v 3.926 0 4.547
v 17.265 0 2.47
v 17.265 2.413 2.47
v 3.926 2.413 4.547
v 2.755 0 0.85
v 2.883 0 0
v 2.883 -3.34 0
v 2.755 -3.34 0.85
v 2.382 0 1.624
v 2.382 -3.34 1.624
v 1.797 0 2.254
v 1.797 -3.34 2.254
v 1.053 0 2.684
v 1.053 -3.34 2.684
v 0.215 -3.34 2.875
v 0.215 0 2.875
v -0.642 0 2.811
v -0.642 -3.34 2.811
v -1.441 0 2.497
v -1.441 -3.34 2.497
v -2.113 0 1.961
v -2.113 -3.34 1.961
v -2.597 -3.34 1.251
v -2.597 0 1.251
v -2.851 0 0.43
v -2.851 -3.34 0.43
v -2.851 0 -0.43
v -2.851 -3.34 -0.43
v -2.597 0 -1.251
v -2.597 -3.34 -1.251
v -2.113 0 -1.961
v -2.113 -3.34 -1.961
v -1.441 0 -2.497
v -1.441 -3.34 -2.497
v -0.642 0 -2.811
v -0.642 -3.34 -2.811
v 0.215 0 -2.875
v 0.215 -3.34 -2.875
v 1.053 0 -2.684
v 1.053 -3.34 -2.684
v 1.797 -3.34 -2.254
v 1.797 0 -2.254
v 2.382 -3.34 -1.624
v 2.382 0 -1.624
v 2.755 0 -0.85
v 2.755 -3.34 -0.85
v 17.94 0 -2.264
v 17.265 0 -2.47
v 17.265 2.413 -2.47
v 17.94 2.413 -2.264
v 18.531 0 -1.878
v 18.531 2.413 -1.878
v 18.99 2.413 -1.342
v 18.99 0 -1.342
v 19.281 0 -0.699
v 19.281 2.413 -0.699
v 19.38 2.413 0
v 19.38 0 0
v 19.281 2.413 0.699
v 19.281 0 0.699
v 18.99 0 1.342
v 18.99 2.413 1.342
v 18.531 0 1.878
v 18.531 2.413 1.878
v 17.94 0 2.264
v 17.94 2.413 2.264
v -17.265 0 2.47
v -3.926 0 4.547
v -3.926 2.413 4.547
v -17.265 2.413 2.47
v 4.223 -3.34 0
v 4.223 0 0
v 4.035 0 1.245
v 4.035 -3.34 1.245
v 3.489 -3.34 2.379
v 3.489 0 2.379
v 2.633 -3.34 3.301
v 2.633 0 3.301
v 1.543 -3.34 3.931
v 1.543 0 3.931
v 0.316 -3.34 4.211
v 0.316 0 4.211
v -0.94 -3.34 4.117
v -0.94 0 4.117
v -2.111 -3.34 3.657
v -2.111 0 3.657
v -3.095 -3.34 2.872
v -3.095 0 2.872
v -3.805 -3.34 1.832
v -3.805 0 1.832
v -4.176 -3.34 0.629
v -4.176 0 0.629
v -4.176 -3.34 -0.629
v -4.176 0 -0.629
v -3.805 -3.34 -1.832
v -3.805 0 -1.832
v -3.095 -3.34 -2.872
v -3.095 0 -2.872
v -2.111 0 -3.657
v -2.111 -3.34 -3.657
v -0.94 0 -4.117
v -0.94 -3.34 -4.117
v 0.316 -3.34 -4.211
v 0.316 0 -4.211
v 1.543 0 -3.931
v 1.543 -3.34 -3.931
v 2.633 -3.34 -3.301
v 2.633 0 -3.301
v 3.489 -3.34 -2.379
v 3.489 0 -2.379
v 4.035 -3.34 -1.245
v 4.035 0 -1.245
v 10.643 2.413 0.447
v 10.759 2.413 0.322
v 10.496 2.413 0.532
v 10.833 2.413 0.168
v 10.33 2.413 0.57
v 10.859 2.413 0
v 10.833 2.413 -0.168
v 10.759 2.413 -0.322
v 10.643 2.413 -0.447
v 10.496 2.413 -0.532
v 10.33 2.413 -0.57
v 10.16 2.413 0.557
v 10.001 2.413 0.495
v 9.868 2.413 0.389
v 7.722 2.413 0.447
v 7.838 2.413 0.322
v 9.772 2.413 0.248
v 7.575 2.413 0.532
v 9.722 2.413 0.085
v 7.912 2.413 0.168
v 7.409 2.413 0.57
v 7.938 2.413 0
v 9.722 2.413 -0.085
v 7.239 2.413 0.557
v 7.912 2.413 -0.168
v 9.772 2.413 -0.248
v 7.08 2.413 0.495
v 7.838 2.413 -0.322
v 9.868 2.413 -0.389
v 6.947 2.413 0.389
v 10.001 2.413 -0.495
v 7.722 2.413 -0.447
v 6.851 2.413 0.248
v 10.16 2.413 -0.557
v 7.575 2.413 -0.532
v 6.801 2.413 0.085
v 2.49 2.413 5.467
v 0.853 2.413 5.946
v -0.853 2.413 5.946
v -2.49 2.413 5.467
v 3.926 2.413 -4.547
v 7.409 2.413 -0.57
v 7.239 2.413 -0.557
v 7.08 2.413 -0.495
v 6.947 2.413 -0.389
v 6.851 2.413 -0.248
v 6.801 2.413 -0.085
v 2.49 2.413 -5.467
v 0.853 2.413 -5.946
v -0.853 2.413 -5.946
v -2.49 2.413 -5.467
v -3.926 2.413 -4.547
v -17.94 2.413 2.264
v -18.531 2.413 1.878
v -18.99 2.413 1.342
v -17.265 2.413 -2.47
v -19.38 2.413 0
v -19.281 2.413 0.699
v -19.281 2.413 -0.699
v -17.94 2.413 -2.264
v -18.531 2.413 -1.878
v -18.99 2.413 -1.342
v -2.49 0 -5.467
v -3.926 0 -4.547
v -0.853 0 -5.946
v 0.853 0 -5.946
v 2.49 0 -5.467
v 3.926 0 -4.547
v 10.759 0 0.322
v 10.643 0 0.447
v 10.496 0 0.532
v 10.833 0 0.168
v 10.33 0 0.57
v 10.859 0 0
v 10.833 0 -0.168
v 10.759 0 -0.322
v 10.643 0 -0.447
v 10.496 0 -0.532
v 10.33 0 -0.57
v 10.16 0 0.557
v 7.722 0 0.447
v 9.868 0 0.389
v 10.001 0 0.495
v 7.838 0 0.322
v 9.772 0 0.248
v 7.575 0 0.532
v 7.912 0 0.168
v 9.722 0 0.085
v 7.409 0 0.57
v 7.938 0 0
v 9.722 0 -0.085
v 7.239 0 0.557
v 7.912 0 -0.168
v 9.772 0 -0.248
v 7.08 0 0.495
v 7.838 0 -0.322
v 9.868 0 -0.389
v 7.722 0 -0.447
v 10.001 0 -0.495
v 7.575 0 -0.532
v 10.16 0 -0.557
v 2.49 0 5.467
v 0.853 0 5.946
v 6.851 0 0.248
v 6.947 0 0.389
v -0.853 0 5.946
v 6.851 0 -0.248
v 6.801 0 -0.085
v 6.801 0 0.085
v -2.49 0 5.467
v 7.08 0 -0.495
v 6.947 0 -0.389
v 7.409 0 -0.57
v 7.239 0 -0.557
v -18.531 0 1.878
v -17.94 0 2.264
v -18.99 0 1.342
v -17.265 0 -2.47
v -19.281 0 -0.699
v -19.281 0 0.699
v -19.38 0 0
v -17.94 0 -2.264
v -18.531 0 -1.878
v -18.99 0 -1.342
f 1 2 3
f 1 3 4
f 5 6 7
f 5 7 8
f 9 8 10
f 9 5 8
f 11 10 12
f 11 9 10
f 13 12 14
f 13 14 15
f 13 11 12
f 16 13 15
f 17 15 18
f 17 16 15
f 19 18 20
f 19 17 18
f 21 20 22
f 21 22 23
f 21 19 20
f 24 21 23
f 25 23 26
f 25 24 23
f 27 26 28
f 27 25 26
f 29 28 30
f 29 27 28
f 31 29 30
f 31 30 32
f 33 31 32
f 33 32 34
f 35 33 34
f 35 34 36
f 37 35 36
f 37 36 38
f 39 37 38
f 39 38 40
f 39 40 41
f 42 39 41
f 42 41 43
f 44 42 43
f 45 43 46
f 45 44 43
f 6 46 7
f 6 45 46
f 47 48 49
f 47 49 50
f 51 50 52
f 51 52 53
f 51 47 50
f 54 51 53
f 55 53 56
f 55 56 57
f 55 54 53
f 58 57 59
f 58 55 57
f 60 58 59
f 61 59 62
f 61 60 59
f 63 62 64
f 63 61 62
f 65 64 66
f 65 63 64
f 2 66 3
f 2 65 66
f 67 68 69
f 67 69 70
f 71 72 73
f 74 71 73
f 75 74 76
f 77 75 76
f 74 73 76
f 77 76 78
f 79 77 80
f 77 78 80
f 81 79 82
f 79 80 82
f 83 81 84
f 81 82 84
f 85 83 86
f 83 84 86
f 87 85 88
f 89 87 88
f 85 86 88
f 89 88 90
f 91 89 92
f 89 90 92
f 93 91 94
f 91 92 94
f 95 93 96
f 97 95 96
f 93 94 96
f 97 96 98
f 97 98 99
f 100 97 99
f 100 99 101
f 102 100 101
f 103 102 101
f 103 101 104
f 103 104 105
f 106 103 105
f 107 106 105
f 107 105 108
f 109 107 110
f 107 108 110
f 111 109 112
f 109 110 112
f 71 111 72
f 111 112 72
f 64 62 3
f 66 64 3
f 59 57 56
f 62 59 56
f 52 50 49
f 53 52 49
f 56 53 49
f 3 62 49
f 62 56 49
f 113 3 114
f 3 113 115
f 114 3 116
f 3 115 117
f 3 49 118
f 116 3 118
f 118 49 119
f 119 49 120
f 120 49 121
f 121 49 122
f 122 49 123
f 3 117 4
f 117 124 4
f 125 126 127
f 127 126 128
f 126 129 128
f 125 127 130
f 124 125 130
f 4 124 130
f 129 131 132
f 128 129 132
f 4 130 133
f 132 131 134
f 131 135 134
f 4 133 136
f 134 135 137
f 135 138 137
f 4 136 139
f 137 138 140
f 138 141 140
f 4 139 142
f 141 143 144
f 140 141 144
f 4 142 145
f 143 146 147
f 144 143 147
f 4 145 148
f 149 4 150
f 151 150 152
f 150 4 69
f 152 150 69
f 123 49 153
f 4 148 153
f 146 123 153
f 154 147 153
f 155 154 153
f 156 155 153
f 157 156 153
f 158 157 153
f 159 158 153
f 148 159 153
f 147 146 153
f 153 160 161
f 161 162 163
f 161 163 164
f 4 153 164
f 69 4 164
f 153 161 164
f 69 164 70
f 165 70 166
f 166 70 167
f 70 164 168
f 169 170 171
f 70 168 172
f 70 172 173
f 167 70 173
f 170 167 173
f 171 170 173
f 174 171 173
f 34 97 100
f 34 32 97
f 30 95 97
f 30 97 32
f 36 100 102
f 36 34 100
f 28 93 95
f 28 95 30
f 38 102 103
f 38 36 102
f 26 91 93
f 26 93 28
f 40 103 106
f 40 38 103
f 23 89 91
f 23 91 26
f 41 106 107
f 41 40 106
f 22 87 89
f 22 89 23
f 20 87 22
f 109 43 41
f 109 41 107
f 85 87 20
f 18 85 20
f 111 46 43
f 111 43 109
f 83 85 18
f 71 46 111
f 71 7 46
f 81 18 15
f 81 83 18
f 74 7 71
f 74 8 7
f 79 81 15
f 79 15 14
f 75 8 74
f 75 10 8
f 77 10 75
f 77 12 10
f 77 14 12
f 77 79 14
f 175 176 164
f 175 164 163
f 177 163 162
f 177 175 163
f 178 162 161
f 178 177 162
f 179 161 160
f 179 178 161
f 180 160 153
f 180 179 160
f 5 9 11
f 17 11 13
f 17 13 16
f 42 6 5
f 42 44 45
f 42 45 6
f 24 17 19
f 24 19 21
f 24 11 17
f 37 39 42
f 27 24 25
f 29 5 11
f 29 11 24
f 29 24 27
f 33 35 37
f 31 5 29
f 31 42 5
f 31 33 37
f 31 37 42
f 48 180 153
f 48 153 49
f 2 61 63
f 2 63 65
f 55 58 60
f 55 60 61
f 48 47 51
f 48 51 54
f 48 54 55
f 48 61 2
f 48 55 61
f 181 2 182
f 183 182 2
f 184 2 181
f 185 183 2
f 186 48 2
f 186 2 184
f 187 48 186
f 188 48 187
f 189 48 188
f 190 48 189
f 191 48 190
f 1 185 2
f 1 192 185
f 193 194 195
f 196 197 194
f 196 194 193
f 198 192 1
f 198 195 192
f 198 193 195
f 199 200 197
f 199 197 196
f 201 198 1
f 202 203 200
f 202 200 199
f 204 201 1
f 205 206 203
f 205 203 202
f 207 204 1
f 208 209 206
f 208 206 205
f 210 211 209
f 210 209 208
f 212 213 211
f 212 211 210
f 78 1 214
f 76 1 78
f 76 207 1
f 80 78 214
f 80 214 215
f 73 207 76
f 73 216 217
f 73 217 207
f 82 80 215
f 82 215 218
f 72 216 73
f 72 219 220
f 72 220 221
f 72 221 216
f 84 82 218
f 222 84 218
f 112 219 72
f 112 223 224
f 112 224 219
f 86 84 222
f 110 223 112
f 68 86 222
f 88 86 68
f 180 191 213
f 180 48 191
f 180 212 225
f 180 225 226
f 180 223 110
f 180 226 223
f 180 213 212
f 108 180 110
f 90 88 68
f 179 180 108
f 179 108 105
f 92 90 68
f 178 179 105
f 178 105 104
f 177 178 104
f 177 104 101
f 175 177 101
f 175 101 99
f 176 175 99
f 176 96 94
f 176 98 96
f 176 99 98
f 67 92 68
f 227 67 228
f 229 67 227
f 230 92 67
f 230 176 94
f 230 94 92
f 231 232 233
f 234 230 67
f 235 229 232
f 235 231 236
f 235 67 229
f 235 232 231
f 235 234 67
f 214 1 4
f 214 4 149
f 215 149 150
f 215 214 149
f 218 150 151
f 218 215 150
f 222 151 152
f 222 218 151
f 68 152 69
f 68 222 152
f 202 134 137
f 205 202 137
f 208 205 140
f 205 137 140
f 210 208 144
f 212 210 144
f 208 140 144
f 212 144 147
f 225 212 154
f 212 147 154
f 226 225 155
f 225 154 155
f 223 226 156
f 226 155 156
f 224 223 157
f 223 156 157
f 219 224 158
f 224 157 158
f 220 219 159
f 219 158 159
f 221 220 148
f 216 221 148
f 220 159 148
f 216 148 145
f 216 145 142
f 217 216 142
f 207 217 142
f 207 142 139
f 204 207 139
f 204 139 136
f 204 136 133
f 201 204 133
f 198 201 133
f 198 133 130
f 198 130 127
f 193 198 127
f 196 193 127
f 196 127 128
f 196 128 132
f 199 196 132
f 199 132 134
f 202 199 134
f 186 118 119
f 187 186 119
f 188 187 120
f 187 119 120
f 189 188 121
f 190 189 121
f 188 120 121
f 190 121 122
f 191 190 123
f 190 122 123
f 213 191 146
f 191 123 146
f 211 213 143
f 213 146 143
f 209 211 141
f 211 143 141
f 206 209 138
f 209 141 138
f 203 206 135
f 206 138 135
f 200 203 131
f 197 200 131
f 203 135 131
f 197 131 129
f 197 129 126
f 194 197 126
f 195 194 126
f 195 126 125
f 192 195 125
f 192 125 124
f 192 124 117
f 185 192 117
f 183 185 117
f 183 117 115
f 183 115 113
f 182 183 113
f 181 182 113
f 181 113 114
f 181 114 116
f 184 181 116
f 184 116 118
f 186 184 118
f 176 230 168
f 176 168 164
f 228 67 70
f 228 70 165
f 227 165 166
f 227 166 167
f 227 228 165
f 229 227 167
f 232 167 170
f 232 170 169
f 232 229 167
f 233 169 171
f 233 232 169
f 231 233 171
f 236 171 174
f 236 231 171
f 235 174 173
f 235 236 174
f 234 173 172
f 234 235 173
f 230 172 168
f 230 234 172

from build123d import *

# Parameters (mm, degrees)
BOSS_EXTRUDE1_DEPTH = 2.413
SKETCH2_R           = 4.22275
SKETCH2_R_2         = 2.8829
BOSS_EXTRUDE2_DEPTH = 3.3401
CUT_EXTRUDE1_REACH  = 7.753
SKETCH3_R           = 0.5715


with BuildPart() as part:
    # Sketch1 → Boss-Extrude1 (new body)
    with BuildSketch(Plane(origin=(0, 0, 0), x_dir=(1, 0, 0), z_dir=(0, 1, 0))):
        with BuildLine():
            Line((3.926025834, 4.5466), (17.264827457, 2.47015))
            ThreePointArc((17.264827457, 2.47015), (19.3802, 0), (17.264827457, -2.47015))
            Line((17.264827457, -2.47015), (3.926025834, -4.5466))
            ThreePointArc((3.926025834, -4.5466), (0, -6.0071), (-3.926025834, -4.5466))
            Line((-3.926025834, -4.5466), (-17.264827457, -2.47015))
            ThreePointArc((-17.264827457, -2.47015), (-19.3802, 0), (-17.264827457, 2.47015))
            Line((-17.264827457, 2.47015), (-3.926025834, 4.5466))
            ThreePointArc((-3.926025834, 4.5466), (0, 6.0071), (3.926025834, 4.5466))
        make_face()
    extrude(amount=BOSS_EXTRUDE1_DEPTH)

    # Sketch2 → Boss-Extrude2 (add)
    with BuildSketch(Plane.XZ):
        Circle(SKETCH2_R)
        Circle(SKETCH2_R_2, mode=Mode.SUBTRACT)
    extrude(amount=BOSS_EXTRUDE2_DEPTH)

    # Sketch3 → Cut-Extrude1 (cut, up to next)
    with BuildSketch(Plane(origin=(0, 2.413, 0), x_dir=(1, 0, 0), z_dir=(0, 1, 0)), mode=Mode.PRIVATE) as cut_extrude1_sk1:
        with Locations((7.366, 0)):
            Circle(SKETCH3_R)
    cut_extrude1_tool1 = extrude(cut_extrude1_sk1.sketch, amount=-CUT_EXTRUDE1_REACH, mode=Mode.PRIVATE) & part.part
    add(cut_extrude1_tool1.solids().sort_by_distance((7.366, 2.413, 0))[0], mode=Mode.SUBTRACT)
    # Sketch3 → Cut-Extrude1 (cut, up to next)
    with BuildSketch(Plane(origin=(0, 2.413, 0), x_dir=(1, 0, 0), z_dir=(0, 1, 0)), mode=Mode.PRIVATE) as cut_extrude1_sk2:
        with Locations((10.287, 0)):
            Circle(SKETCH3_R)
    cut_extrude1_tool2 = extrude(cut_extrude1_sk2.sketch, amount=-CUT_EXTRUDE1_REACH, mode=Mode.PRIVATE) & part.part
    add(cut_extrude1_tool2.solids().sort_by_distance((10.287, 2.413, 0))[0], mode=Mode.SUBTRACT)


solid = part.part
